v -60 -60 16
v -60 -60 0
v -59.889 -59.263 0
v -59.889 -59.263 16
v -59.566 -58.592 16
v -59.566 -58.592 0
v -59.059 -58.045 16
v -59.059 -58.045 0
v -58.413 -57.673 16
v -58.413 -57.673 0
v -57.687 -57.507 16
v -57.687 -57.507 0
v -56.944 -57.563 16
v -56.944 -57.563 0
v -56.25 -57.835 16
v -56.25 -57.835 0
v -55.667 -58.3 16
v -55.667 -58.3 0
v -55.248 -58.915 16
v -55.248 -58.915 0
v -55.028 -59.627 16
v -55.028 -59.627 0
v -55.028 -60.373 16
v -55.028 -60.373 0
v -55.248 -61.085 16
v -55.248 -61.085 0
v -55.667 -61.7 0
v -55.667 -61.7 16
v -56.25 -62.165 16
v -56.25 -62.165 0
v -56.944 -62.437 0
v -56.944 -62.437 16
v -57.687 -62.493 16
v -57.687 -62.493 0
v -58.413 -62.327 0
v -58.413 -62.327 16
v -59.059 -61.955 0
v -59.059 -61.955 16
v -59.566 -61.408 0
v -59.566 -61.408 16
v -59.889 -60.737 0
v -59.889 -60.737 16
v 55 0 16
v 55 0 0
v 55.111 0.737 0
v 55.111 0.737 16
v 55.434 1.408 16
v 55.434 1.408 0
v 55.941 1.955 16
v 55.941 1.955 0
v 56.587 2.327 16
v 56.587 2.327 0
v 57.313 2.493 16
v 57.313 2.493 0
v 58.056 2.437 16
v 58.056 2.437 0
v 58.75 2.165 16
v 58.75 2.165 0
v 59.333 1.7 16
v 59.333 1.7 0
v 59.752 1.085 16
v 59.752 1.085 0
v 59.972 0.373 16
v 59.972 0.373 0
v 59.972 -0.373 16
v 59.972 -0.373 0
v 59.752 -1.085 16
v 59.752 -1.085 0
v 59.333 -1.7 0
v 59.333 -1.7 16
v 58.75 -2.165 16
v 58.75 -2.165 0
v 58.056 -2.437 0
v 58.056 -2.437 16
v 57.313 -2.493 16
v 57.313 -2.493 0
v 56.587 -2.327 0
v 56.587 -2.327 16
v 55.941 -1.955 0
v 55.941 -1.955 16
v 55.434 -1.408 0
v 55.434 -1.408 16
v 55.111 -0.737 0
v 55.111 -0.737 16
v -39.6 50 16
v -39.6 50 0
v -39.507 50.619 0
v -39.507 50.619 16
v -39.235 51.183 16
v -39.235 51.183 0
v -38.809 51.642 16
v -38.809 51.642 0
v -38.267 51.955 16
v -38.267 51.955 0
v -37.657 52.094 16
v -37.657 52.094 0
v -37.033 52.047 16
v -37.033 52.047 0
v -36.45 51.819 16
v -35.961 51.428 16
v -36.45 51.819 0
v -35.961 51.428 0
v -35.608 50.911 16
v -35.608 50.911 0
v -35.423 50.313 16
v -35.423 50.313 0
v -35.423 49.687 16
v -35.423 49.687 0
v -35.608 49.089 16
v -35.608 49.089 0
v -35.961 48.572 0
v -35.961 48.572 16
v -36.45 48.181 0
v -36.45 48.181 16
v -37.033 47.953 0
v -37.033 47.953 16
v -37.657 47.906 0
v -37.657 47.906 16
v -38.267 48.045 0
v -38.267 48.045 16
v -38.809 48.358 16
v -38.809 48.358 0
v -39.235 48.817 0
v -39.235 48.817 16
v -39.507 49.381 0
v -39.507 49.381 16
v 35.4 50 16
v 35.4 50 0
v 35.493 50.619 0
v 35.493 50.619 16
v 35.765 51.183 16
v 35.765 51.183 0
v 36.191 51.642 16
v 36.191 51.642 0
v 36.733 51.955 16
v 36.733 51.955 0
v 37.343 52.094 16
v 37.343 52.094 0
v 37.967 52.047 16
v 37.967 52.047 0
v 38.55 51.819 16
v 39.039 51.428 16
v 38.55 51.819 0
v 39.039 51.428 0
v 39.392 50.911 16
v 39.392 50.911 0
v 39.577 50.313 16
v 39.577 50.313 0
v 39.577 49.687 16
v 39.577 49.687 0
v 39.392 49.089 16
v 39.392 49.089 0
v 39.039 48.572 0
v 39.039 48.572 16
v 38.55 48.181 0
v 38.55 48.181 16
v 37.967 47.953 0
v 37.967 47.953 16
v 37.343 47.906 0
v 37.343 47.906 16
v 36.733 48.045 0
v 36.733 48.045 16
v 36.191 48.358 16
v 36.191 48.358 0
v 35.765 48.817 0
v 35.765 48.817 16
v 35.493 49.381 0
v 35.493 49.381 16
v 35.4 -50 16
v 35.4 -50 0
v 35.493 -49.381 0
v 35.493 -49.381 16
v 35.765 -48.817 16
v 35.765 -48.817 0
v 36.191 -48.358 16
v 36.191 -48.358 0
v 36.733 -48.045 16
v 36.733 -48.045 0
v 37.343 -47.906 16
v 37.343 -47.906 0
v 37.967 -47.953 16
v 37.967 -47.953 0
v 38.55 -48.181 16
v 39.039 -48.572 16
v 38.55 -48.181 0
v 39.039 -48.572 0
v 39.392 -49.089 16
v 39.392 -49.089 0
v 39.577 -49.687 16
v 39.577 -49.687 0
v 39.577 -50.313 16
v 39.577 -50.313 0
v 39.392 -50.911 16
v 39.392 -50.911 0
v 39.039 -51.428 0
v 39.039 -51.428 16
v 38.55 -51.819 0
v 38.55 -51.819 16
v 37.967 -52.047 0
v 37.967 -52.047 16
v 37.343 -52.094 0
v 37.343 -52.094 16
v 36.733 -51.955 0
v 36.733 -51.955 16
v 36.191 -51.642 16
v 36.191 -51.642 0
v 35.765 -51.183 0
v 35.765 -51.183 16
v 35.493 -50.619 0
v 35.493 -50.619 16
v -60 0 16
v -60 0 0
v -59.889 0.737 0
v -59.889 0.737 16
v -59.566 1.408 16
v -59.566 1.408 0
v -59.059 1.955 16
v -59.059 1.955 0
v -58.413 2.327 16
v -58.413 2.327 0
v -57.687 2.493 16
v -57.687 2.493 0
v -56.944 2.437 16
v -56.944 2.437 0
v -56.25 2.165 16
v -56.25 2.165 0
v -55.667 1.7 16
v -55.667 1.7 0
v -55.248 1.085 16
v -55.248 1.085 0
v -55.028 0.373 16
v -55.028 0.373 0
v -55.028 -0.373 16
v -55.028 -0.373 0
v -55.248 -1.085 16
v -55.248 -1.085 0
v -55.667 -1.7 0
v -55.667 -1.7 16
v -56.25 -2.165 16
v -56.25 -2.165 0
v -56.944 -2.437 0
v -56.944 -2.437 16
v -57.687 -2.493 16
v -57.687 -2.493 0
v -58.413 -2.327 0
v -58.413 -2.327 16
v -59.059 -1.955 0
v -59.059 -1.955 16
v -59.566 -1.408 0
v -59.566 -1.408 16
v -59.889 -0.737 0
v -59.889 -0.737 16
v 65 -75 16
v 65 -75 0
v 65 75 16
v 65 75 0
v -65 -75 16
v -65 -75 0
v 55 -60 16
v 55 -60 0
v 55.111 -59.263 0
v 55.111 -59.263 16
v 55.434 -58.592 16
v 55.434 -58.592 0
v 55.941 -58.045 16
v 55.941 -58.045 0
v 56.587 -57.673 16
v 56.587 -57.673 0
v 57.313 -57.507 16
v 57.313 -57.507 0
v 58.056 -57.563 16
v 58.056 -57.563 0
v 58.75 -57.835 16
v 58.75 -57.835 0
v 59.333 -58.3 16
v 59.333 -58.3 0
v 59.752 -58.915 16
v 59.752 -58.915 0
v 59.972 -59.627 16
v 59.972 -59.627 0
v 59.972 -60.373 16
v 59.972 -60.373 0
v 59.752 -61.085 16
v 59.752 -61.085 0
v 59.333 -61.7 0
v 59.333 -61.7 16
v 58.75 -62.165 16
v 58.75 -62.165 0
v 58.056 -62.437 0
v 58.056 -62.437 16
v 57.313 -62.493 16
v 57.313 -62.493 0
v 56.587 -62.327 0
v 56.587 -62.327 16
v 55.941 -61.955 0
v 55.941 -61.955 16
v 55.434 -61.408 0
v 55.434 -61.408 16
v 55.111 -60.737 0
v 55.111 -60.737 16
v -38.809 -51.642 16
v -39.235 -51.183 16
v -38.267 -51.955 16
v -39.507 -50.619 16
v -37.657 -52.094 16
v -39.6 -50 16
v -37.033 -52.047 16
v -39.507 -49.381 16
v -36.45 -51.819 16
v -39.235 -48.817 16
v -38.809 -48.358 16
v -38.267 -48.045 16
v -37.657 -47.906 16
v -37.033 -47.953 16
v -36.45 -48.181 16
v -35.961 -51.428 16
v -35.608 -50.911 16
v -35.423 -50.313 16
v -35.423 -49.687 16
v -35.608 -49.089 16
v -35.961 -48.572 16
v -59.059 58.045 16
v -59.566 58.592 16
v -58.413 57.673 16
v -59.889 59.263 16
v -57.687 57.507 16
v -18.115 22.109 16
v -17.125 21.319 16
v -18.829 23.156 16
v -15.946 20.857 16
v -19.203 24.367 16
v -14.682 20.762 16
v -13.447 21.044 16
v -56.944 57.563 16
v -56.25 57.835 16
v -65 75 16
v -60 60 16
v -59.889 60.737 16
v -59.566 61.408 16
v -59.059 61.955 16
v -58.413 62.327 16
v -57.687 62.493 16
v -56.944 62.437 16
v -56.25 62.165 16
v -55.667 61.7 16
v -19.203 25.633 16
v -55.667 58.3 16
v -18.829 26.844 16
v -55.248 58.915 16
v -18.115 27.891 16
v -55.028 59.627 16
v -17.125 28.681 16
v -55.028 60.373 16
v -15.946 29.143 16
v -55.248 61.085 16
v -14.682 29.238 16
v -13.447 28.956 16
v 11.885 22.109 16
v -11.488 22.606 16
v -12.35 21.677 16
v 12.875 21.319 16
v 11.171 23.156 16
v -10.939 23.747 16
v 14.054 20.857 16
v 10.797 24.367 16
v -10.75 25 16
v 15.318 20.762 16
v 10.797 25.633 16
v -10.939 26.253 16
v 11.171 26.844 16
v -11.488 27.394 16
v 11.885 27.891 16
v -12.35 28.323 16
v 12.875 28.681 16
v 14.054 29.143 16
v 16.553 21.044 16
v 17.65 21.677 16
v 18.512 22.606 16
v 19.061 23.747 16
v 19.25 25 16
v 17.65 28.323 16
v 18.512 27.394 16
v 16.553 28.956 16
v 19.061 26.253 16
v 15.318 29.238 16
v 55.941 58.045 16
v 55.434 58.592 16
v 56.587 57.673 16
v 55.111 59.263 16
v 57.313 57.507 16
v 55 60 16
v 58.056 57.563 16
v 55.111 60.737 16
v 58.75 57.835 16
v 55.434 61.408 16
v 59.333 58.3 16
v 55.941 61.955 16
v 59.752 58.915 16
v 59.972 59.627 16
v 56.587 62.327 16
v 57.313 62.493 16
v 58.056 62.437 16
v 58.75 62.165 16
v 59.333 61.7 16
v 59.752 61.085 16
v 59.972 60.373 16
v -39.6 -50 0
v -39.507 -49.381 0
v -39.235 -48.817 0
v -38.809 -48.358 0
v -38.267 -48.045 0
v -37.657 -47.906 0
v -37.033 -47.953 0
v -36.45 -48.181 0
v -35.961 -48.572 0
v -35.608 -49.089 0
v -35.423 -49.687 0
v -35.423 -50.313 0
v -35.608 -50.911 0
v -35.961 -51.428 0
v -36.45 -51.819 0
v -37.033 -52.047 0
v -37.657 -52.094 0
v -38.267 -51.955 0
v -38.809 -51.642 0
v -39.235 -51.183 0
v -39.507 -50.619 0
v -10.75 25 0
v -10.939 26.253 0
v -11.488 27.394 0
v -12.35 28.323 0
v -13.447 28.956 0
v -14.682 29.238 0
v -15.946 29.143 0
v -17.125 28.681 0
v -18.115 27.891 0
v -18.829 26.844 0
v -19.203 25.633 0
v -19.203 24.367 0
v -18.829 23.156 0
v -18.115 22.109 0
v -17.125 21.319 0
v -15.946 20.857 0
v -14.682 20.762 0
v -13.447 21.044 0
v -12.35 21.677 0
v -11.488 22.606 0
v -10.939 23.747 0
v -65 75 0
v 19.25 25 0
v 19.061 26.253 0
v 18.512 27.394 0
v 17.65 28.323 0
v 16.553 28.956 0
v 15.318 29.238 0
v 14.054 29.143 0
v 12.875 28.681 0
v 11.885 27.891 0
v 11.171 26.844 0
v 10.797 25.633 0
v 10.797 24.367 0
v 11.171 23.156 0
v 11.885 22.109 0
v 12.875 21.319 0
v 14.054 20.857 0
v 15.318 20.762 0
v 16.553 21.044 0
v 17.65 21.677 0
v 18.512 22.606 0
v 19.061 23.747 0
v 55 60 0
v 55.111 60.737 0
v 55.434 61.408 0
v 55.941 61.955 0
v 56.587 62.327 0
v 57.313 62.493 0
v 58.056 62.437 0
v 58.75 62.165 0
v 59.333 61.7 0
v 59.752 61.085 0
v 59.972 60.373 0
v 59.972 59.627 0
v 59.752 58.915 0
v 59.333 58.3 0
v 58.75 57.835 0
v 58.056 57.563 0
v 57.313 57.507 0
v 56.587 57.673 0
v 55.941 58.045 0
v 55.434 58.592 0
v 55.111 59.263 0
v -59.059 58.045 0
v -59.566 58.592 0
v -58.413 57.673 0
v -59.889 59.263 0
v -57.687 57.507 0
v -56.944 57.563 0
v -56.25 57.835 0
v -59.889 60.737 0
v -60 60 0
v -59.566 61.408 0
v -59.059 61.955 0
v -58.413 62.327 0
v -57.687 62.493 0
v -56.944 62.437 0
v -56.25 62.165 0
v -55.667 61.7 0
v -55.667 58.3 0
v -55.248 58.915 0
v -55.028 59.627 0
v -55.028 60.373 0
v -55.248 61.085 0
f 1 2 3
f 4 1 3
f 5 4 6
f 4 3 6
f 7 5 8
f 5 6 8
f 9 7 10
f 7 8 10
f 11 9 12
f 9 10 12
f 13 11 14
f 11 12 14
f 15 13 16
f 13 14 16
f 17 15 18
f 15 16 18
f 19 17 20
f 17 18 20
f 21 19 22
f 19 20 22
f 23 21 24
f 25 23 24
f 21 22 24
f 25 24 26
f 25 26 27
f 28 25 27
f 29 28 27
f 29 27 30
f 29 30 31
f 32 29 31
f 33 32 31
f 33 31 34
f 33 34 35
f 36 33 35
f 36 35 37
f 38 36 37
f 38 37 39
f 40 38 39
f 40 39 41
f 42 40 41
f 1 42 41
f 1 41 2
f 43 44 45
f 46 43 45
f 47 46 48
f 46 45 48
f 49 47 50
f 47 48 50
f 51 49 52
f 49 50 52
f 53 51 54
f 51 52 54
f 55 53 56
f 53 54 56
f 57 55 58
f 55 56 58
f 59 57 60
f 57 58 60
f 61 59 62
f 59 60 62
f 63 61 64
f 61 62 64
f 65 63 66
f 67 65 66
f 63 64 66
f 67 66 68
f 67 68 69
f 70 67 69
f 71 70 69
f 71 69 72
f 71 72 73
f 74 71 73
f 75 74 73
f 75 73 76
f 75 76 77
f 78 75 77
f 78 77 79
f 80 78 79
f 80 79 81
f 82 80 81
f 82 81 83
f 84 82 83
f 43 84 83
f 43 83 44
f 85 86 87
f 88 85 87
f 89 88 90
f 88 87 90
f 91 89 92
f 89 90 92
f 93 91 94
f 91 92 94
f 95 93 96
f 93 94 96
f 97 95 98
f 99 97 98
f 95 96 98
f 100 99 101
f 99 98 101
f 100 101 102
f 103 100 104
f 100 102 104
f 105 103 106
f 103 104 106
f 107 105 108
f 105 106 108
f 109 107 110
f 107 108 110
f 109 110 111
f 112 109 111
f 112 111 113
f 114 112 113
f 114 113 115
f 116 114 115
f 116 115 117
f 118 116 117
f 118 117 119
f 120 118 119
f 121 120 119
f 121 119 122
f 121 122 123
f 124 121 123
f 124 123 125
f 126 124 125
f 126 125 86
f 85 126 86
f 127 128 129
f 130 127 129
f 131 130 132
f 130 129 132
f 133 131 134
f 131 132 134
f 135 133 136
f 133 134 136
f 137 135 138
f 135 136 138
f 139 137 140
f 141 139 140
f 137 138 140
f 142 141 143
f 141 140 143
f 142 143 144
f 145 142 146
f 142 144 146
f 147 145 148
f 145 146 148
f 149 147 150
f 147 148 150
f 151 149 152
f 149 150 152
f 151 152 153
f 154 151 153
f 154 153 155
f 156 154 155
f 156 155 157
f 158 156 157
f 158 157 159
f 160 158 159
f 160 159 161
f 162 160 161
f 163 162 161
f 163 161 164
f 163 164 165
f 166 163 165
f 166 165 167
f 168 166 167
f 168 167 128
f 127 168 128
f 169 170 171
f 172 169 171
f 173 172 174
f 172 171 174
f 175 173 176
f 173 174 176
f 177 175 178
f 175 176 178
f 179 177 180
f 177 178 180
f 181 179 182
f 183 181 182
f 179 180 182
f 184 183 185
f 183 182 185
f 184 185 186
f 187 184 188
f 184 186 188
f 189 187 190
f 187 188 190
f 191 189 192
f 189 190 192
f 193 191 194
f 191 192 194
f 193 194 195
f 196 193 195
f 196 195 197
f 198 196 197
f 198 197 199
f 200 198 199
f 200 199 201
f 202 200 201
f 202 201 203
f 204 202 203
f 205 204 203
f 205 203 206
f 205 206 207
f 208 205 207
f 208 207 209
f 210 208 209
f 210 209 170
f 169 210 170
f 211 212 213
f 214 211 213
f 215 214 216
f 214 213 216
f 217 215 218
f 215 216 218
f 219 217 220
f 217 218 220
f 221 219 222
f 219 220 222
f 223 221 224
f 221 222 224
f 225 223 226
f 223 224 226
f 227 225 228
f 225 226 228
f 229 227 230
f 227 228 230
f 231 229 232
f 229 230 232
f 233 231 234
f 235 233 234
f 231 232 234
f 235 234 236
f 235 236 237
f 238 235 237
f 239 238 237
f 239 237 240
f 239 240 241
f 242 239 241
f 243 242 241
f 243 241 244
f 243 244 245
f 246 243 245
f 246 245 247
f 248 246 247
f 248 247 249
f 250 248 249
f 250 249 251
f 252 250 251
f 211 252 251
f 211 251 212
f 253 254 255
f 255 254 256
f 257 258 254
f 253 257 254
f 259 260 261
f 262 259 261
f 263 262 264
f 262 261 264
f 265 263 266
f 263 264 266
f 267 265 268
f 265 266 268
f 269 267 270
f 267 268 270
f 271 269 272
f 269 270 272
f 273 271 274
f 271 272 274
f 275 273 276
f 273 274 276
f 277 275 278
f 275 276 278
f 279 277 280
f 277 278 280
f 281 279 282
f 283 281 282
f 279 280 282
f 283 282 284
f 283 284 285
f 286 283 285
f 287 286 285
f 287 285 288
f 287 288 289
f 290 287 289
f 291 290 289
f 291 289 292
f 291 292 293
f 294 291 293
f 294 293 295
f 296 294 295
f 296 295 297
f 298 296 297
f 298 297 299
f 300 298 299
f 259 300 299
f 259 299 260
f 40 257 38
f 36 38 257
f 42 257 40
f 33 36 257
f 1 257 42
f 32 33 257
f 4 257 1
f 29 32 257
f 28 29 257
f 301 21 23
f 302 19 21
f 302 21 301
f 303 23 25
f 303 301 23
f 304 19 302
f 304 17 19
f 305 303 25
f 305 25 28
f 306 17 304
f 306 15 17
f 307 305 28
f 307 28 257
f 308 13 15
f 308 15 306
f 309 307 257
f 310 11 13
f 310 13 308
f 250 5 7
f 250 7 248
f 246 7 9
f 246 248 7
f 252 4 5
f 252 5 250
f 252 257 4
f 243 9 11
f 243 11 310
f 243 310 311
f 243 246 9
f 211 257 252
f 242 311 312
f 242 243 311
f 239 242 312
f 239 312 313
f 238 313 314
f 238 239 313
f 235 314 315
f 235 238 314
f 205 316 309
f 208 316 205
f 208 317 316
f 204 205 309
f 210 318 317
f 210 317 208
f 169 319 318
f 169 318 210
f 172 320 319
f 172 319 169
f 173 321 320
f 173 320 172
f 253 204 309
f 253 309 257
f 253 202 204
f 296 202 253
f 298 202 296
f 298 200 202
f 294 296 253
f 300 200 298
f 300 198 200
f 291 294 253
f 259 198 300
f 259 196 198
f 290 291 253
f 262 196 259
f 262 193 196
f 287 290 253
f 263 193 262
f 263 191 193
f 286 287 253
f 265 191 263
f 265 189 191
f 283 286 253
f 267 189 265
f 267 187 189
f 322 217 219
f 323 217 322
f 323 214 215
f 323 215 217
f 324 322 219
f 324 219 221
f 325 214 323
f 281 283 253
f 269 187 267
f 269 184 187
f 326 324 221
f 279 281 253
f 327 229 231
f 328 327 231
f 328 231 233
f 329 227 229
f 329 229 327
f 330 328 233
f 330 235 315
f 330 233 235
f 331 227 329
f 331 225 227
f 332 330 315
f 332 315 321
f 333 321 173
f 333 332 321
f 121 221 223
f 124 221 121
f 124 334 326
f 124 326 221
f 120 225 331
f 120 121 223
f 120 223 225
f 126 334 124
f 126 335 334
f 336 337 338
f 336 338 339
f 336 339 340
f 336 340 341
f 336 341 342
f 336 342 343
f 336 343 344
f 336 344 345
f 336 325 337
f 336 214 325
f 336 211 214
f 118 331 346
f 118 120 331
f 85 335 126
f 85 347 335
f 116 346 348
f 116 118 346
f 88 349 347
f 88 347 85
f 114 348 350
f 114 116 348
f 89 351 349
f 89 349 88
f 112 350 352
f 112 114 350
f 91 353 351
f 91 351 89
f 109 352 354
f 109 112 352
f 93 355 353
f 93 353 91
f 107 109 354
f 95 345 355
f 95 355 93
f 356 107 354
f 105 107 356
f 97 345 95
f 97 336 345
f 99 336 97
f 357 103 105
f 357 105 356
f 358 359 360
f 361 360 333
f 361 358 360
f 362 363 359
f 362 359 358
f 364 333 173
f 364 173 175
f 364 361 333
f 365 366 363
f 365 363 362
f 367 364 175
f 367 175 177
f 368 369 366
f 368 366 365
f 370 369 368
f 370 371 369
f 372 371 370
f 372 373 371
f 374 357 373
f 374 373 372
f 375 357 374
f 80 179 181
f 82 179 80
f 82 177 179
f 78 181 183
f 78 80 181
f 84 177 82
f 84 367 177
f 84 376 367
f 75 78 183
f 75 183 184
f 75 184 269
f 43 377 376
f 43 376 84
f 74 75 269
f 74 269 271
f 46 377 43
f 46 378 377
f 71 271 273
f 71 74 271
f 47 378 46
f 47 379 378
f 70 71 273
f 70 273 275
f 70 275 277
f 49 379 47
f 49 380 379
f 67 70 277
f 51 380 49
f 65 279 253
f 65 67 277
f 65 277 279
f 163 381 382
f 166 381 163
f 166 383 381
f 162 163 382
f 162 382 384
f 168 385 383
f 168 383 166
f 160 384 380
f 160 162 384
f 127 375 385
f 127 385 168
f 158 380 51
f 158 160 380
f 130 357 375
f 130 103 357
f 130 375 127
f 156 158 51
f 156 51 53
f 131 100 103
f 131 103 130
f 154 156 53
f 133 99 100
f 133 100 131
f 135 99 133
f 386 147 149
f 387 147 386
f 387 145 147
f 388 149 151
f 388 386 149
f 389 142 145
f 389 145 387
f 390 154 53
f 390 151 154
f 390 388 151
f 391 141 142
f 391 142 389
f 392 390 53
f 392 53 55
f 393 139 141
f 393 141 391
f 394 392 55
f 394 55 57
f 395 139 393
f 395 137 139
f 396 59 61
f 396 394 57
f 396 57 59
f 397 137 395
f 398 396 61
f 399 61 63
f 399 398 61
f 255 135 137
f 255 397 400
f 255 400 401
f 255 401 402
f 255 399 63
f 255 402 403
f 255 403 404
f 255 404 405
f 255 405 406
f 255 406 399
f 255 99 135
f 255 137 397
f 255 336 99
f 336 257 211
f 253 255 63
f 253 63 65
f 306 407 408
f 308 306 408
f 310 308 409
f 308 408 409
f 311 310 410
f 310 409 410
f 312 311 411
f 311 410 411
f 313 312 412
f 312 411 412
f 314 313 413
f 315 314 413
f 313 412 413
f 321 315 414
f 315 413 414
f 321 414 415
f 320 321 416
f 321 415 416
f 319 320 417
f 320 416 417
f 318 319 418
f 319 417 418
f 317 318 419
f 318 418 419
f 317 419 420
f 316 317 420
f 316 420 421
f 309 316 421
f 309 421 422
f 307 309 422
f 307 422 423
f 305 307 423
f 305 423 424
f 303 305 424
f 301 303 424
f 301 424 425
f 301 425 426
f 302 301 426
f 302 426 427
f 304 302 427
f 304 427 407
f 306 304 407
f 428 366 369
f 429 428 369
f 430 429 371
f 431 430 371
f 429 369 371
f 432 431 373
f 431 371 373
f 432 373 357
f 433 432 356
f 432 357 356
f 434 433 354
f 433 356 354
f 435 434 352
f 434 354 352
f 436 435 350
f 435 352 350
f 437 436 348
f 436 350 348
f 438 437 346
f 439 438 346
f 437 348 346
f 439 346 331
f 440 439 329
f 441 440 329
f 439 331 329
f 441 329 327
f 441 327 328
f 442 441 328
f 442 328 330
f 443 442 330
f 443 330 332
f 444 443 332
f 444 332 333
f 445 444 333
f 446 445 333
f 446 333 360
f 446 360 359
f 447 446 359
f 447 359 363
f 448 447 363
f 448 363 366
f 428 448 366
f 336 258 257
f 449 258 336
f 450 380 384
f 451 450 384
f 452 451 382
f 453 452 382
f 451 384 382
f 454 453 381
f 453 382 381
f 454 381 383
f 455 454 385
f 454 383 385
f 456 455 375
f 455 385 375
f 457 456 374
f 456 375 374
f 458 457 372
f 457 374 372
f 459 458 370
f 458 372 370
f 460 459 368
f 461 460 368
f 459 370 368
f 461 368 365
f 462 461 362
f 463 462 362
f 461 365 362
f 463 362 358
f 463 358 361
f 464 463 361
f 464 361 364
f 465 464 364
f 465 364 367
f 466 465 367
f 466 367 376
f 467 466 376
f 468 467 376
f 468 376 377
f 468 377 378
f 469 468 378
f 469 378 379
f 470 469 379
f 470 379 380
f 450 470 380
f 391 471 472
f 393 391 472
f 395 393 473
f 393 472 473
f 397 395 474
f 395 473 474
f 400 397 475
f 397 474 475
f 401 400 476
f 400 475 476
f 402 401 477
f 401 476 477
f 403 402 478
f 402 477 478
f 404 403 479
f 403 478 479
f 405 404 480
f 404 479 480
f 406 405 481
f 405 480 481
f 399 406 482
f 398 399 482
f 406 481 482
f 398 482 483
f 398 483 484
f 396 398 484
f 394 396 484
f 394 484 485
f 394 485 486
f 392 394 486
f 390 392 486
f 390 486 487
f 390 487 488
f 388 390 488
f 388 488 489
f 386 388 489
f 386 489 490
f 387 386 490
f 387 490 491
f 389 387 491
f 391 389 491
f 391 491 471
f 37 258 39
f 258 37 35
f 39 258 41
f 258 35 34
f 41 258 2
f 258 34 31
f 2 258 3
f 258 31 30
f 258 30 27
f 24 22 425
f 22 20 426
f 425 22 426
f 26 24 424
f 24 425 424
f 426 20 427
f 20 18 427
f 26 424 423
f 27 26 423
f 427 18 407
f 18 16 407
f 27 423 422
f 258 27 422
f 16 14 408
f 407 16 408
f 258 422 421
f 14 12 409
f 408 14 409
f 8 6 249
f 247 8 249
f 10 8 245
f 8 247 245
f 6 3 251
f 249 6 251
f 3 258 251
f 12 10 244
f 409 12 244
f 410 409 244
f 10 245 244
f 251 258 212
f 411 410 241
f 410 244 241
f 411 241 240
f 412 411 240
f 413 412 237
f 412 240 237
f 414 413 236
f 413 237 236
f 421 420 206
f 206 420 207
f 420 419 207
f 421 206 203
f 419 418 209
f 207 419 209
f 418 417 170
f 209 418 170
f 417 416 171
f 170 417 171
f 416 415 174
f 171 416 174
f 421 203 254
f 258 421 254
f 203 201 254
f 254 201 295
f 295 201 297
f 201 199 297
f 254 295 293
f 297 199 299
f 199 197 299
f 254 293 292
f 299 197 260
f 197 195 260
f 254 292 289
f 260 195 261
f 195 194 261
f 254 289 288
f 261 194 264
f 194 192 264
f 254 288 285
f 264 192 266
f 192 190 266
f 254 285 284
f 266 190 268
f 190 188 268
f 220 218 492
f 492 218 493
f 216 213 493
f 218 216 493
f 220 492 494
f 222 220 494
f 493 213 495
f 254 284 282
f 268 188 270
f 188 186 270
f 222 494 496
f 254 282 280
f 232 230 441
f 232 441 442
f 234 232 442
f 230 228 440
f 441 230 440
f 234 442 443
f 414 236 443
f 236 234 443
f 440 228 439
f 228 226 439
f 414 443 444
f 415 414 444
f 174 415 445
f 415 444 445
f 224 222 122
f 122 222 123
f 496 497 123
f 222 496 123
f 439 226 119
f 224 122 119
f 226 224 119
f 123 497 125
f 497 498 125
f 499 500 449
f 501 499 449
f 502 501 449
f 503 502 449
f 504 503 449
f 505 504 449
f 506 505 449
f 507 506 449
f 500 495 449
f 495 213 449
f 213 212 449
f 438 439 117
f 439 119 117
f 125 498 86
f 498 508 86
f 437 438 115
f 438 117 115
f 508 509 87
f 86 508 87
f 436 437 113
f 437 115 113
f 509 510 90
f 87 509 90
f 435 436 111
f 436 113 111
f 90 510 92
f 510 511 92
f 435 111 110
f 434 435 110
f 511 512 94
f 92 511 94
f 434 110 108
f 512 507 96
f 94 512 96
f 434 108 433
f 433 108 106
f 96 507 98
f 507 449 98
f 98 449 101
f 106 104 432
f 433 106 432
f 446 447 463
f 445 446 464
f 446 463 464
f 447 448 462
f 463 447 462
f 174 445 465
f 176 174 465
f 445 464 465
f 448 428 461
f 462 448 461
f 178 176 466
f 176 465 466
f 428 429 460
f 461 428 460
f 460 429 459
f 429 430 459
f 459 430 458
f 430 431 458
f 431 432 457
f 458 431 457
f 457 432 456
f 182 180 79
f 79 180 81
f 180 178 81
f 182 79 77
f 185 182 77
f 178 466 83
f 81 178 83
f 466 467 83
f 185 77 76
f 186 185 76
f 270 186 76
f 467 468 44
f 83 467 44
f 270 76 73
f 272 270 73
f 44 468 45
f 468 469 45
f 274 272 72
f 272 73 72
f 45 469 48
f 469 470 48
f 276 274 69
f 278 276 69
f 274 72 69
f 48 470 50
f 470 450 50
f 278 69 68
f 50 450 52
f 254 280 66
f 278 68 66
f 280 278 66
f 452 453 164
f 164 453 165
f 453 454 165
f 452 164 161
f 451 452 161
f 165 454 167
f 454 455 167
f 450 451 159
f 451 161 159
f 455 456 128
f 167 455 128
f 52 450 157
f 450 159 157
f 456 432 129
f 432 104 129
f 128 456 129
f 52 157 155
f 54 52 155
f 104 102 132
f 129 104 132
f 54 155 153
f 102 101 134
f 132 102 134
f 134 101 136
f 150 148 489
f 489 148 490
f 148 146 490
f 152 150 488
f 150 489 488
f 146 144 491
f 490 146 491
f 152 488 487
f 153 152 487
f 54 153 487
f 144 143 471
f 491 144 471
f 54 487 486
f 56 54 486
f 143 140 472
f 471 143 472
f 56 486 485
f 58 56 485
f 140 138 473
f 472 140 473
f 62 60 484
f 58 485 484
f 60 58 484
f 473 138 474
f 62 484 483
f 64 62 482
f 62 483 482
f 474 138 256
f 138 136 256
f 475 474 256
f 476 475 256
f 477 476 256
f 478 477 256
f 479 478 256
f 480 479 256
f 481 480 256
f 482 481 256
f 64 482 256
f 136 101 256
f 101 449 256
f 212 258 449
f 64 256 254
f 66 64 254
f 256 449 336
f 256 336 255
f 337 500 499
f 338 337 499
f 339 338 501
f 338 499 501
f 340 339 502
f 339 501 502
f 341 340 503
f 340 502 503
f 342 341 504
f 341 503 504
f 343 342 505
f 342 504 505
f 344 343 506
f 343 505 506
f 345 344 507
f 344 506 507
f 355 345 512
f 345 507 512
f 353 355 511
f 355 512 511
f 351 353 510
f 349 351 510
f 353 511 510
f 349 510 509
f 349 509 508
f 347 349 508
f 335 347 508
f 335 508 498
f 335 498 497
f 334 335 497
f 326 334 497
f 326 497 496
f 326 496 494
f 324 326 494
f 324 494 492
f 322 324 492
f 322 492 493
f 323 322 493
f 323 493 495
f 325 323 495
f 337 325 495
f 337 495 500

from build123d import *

# Parameters (mm, degrees)
SKETCH1_W              = 130
SKETCH1_H              = 150
EXTRUDE1_DEPTH         = 16
M6_TAPPED_HOLE1_D      = 5
M5_TAPPED_HOLE1_D      = 4.2
M5_TAPPED_HOLE1_DEPTH  = 16
M10_TAPPED_HOLE1_D     = 8.5
M10_TAPPED_HOLE1_DEPTH = 27.5
M10_TAPPED_HOLE1_TIP   = 2.553657631
M10_TAPPED_HOLE2_D     = 8.5
M10_TAPPED_HOLE2_DEPTH = 27.5
M10_TAPPED_HOLE2_TIP   = 2.553657631


with BuildPart() as part:
    # Sketch1 → Extrude1 (new body)
    with BuildSketch(Plane.XY):
        Rectangle(SKETCH1_W, SKETCH1_H)
    extrude(amount=EXTRUDE1_DEPTH)

    # M6 Tapped Hole1 (through all)
    with Locations(Plane.XY.offset(16)):
        with Locations((-57.5, 60), (-57.5, 0), (-57.5, -60), (57.5, -60), (57.5, 0), (57.5, 60)):
            Hole(M6_TAPPED_HOLE1_D / 2)

    # M5 Tapped Hole1
    with Locations(Plane.XY.offset(16)):
        with Locations((-37.5, 50), (37.5, 50), (37.5, -50), (-37.5, -50)):
            Hole(M5_TAPPED_HOLE1_D / 2, depth=M5_TAPPED_HOLE1_DEPTH)

    # M10 Tapped Hole1
    with Locations(Plane(origin=(0, 0, 0), x_dir=(-1, 0, 0), z_dir=(0, 0, -1))):
        with Locations((-15, 25)):
            Hole(M10_TAPPED_HOLE1_D / 2, depth=M10_TAPPED_HOLE1_DEPTH)
            with Locations((0, 0, -(M10_TAPPED_HOLE1_DEPTH + M10_TAPPED_HOLE1_TIP / 2))):  # 118° drill point
                Cone(0, M10_TAPPED_HOLE1_D / 2, M10_TAPPED_HOLE1_TIP, mode=Mode.SUBTRACT)

    # M10 Tapped Hole2
    with Locations(Plane(origin=(0, 0, 0), x_dir=(-1, 0, 0), z_dir=(0, 0, -1))):
        with Locations((15, 25)):
            Hole(M10_TAPPED_HOLE2_D / 2, depth=M10_TAPPED_HOLE2_DEPTH)
            with Locations((0, 0, -(M10_TAPPED_HOLE2_DEPTH + M10_TAPPED_HOLE2_TIP / 2))):  # 118° drill point
                Cone(0, M10_TAPPED_HOLE2_D / 2, M10_TAPPED_HOLE2_TIP, mode=Mode.SUBTRACT)


solid = part.part
